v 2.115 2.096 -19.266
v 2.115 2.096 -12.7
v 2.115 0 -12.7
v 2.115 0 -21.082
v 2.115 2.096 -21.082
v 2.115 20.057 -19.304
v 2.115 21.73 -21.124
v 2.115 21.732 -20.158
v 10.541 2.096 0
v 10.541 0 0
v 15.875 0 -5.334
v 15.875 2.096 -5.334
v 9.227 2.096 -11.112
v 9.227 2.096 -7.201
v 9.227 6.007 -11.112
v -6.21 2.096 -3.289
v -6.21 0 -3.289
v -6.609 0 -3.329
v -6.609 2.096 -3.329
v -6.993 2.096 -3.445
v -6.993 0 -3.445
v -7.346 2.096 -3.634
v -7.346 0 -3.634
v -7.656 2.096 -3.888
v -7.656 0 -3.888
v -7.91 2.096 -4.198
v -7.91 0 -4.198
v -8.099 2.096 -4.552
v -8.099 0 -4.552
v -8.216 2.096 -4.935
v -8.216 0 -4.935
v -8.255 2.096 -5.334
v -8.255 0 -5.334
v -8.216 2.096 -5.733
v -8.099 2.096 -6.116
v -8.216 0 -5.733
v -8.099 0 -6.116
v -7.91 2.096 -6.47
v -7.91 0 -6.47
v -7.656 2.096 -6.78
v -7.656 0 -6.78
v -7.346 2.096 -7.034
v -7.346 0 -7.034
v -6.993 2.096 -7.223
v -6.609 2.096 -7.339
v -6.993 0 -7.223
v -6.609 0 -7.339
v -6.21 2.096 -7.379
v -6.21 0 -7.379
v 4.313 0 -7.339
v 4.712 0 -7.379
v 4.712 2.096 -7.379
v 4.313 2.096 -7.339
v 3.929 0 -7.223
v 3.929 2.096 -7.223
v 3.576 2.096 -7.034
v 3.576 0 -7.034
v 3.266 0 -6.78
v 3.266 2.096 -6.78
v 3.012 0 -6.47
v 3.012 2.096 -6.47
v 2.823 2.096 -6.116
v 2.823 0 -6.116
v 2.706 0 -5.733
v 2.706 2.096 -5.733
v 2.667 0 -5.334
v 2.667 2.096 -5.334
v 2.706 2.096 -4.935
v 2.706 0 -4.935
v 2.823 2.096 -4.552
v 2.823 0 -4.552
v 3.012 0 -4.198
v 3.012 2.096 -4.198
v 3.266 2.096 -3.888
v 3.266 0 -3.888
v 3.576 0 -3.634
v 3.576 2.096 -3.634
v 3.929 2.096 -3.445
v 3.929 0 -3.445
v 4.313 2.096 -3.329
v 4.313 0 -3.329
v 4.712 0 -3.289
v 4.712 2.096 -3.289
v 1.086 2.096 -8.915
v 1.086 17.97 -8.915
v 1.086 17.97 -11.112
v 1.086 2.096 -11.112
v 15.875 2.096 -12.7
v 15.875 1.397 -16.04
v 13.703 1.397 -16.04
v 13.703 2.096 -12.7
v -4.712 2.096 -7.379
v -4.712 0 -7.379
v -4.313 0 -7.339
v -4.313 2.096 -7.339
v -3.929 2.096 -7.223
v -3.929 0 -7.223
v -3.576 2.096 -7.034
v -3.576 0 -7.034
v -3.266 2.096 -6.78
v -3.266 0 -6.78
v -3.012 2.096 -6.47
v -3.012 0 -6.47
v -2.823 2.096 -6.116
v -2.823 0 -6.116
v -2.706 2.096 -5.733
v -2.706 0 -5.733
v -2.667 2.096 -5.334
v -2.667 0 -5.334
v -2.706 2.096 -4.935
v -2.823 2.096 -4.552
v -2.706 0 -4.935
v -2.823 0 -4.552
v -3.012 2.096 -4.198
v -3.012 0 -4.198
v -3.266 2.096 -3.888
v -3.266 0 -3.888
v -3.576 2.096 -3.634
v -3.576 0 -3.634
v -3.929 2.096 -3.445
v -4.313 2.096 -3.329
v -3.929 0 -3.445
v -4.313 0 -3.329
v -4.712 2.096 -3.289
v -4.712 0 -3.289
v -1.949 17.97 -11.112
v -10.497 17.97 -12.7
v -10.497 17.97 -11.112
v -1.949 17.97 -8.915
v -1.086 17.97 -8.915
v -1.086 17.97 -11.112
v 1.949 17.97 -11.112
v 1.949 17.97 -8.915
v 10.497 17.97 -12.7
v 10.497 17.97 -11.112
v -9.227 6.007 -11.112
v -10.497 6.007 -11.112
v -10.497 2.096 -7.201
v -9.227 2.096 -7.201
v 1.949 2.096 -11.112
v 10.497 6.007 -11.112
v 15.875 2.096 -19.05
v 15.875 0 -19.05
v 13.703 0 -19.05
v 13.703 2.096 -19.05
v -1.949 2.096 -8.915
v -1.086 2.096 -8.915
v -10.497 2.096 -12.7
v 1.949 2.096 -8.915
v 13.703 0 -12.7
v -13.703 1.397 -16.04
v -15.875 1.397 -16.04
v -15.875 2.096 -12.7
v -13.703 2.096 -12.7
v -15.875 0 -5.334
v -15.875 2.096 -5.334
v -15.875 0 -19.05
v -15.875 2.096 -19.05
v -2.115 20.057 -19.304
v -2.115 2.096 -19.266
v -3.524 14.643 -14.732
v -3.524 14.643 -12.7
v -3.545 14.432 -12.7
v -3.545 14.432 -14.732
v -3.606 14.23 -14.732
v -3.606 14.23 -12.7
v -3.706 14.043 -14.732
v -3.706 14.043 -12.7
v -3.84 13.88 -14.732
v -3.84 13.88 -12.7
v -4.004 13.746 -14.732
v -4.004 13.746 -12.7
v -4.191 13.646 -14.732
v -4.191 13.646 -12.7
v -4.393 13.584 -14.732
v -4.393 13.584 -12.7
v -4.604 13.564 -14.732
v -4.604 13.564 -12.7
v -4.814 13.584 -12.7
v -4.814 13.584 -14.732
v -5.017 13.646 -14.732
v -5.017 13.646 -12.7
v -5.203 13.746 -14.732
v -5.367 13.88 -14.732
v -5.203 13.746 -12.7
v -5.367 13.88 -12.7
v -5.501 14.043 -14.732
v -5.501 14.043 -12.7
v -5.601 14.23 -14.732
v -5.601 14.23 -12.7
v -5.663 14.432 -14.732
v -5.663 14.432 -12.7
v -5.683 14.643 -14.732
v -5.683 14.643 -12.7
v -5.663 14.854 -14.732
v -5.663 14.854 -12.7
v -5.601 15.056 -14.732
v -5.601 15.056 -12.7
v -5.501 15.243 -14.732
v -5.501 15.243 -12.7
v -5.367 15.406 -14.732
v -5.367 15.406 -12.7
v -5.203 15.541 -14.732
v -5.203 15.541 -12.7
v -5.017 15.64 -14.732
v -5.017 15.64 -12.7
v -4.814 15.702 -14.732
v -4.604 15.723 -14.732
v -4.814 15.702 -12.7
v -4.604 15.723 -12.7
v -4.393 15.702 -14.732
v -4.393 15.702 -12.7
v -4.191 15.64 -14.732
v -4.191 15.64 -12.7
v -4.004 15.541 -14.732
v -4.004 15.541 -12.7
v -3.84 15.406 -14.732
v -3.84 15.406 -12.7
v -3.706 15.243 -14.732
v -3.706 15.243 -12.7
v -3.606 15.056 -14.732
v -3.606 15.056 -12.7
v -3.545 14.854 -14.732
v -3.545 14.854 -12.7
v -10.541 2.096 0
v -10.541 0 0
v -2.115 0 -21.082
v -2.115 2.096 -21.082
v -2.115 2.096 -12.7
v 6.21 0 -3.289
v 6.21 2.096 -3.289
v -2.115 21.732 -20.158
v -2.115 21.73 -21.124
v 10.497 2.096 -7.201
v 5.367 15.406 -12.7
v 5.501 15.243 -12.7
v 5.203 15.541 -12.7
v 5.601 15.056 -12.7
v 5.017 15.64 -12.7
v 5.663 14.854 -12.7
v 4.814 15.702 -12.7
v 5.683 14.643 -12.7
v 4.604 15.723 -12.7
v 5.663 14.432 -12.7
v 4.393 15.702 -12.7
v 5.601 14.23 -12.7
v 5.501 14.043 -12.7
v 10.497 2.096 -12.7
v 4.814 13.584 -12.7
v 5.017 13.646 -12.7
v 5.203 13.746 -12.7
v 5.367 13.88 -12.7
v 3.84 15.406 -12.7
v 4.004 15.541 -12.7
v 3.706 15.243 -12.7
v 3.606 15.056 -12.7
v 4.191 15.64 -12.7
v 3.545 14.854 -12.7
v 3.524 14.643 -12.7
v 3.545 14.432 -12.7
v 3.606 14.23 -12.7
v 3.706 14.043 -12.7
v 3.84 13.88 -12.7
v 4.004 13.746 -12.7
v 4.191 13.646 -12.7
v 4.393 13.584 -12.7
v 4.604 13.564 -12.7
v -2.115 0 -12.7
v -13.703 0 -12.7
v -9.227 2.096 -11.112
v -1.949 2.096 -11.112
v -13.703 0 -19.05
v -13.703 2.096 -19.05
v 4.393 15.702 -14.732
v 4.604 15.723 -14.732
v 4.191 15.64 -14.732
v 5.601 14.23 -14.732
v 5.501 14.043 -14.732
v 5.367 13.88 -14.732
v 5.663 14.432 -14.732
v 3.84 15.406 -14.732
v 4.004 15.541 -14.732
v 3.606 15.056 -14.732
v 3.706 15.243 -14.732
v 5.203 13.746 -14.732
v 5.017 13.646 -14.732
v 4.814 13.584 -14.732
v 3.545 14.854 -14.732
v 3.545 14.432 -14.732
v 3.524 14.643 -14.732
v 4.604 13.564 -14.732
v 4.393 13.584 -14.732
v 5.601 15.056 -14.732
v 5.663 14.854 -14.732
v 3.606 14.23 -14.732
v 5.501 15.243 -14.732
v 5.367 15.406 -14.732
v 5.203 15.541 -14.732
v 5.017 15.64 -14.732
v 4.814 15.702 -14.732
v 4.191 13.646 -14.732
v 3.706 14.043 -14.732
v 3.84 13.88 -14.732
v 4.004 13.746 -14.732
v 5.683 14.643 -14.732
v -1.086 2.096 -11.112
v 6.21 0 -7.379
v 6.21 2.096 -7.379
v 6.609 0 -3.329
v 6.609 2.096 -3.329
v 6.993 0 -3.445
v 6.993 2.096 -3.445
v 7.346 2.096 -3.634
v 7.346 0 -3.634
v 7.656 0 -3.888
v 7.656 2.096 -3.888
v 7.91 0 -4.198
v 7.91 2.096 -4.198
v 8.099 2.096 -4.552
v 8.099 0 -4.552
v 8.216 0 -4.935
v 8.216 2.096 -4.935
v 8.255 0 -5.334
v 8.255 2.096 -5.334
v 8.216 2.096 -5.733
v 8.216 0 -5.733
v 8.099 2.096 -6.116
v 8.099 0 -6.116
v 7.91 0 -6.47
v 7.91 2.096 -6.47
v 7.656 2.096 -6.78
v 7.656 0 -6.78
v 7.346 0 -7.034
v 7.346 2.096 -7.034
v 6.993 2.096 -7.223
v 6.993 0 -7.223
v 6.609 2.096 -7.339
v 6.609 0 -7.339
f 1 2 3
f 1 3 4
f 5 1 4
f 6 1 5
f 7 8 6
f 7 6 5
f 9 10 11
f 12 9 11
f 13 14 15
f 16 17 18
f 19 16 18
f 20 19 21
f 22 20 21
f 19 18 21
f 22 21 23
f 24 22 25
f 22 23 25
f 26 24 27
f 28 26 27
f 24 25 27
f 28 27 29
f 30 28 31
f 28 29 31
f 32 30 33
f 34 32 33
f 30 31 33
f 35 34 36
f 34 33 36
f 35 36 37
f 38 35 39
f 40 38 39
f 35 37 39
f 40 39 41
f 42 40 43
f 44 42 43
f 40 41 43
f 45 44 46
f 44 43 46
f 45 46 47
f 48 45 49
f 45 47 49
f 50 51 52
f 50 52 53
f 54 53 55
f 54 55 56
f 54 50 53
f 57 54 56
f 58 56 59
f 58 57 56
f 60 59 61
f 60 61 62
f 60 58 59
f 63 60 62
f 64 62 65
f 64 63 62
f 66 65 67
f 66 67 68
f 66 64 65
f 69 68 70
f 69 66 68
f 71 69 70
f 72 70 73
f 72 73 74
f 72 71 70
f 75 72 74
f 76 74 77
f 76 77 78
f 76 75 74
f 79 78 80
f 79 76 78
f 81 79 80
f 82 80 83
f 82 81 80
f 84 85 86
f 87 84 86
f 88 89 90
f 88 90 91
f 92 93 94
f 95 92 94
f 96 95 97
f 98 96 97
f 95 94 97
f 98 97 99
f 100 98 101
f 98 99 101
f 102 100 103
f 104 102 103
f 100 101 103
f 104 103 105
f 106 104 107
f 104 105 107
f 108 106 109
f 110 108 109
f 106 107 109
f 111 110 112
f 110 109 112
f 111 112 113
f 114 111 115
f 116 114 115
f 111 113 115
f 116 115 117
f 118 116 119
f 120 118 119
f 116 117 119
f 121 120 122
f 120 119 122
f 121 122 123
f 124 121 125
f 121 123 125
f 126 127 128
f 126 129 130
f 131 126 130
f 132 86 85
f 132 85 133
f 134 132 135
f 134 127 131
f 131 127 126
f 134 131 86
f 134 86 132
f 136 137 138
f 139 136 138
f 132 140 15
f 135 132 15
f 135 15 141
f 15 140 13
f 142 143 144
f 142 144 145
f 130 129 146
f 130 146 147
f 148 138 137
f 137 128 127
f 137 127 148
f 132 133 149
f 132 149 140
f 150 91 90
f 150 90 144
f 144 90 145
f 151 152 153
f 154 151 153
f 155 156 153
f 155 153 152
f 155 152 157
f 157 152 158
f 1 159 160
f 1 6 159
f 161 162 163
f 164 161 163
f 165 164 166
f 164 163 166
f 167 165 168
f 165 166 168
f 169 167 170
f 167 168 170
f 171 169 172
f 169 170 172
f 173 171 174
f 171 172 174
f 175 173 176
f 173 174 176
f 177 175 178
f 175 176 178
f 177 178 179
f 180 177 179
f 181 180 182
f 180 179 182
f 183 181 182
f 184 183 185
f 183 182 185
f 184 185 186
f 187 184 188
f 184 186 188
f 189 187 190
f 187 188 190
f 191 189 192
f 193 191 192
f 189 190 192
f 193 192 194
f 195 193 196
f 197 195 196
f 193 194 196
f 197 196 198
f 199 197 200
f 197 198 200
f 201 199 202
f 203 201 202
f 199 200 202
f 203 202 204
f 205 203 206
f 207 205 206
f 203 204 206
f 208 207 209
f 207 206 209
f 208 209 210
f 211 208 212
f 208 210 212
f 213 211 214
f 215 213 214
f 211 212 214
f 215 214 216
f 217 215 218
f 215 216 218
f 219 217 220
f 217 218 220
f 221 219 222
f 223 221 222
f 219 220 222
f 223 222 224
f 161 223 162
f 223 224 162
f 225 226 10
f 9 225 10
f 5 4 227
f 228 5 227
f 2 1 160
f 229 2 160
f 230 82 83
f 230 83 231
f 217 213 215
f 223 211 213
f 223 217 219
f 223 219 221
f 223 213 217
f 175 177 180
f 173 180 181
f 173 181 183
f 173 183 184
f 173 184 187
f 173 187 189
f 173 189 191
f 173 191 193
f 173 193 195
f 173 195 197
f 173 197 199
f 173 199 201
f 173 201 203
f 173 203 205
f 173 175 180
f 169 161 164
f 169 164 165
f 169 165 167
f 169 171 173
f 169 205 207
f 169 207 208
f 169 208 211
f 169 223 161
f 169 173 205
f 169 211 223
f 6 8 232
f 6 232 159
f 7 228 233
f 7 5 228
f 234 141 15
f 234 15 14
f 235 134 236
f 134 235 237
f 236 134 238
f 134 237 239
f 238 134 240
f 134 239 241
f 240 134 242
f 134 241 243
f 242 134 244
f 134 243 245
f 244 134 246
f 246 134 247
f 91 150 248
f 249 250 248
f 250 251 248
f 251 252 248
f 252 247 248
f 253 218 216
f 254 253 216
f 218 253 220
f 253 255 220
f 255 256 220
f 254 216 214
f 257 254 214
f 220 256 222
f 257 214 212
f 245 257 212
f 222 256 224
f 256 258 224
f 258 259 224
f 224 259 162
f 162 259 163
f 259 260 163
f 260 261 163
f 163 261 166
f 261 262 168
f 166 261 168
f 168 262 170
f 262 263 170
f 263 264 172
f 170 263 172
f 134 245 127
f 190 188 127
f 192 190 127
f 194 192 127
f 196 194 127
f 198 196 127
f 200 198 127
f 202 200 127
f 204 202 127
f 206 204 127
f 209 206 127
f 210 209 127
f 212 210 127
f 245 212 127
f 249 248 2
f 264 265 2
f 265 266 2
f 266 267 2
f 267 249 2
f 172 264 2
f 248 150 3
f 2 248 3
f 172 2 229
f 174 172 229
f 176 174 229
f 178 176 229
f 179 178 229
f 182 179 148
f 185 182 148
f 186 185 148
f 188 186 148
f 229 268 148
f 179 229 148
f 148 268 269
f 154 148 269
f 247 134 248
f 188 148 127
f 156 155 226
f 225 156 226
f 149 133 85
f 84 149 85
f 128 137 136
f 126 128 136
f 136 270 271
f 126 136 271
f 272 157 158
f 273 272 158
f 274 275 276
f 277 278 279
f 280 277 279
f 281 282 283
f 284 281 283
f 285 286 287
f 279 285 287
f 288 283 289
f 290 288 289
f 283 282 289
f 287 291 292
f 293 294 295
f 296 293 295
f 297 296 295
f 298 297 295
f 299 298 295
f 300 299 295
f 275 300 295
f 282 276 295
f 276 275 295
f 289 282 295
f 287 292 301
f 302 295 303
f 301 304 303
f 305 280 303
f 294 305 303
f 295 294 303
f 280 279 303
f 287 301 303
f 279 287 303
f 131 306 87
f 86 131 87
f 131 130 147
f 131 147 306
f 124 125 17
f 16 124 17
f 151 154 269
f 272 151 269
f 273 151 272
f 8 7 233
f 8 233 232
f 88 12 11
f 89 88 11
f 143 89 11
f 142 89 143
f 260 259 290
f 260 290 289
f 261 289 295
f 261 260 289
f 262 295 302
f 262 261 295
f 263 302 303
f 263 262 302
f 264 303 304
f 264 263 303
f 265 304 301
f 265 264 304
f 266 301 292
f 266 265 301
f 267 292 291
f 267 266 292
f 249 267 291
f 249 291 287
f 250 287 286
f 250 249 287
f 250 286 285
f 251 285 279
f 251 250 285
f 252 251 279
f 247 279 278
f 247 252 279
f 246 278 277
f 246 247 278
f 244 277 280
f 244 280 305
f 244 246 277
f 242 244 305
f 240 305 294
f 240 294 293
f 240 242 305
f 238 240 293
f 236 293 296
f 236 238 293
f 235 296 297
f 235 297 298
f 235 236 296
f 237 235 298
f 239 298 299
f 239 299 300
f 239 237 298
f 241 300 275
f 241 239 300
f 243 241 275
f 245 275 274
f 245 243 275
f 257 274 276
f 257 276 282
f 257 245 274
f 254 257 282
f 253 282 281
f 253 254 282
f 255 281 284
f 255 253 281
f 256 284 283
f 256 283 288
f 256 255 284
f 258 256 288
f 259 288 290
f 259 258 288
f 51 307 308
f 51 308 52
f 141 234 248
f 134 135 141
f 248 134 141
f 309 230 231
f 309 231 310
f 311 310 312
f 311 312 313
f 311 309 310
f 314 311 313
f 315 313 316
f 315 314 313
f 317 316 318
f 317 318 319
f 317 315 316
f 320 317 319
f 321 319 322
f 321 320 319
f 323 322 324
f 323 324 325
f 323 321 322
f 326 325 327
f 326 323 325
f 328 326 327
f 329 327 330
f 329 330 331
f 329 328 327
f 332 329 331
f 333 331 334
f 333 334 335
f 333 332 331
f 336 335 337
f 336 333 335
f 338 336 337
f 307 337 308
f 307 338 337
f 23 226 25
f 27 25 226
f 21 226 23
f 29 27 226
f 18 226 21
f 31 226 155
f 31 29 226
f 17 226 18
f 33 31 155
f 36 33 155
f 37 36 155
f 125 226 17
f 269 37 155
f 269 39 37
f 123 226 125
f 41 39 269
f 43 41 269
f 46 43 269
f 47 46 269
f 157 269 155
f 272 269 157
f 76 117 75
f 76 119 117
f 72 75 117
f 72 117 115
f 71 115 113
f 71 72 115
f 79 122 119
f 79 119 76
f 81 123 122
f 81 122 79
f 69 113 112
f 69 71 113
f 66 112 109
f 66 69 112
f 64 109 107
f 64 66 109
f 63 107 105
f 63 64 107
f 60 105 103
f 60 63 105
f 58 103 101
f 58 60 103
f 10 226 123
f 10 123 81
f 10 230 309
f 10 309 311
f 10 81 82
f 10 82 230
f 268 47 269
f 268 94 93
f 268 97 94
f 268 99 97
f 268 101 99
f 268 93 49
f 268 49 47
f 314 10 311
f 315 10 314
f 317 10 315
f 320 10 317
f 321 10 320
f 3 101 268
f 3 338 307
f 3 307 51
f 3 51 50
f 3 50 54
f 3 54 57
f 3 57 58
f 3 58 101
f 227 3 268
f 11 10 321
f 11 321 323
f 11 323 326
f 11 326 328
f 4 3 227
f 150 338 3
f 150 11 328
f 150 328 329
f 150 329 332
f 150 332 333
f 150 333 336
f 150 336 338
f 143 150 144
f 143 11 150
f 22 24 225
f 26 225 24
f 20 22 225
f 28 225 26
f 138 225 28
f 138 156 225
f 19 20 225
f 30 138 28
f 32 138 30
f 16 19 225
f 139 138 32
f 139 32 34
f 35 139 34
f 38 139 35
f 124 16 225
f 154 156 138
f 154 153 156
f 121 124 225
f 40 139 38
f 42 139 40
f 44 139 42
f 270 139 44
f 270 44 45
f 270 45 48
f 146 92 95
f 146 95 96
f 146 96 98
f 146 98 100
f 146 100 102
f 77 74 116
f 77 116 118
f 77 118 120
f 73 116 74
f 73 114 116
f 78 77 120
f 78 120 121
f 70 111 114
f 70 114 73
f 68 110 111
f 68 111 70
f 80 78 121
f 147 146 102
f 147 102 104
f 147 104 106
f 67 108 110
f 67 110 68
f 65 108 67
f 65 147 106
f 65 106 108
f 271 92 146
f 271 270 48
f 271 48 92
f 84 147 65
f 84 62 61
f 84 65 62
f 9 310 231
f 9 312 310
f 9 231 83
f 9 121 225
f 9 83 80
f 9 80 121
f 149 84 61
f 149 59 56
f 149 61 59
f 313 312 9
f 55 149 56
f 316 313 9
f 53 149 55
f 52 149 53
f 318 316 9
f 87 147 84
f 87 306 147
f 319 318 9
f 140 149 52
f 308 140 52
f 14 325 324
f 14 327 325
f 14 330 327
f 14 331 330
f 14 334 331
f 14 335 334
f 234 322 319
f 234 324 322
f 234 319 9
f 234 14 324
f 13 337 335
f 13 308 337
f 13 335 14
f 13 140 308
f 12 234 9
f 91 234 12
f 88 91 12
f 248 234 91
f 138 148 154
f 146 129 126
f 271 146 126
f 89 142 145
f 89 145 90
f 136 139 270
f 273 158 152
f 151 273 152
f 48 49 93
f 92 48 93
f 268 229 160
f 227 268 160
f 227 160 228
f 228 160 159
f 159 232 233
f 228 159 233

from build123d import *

# Parameters (mm, degrees)
BOSS_EXTRUDE1_DEPTH = 2.0955
SKETCH2_W           = 20.9931
SKETCH2_H           = 1.5875
BOSS_EXTRUDE2_DEPTH = 15.875
BOSS_EXTRUDE3_DEPTH = 1.27
SKETCH5_W           = 0.8636
SKETCH5_H           = 2.1971
BOSS_EXTRUDE4_DEPTH = 15.875
SKETCH6_R           = 1.0795
BOSS_EXTRUDE5_DEPTH = 2.032
BOSS_EXTRUDE6_DEPTH = 2.1717
SKETCH8_W           = 4.2291
SKETCH8_H           = 8.382
BOSS_EXTRUDE7_DEPTH = 2.0955
BOSS_EXTRUDE8_DEPTH = 2.11455


with BuildPart() as part:
    # Sketch1 → Boss-Extrude1 (new body)
    with BuildSketch(Plane(origin=(0, 0, 0), x_dir=(1, 0, 0), z_dir=(0, 1, 0))):
        Polygon((10.541, 0), (15.875, 5.334), (15.875, 12.7), (-15.875, 12.7), (-15.875, 5.334), (-10.541, 0), align=None)
        with BuildLine():
            Line((-6.2103, 7.3787), (-4.7117, 7.3787))
            ThreePointArc((-4.7117, 7.3787), (-2.667, 5.334), (-4.7117, 3.2893))
            Line((-4.7117, 3.2893), (-6.2103, 3.2893))
            ThreePointArc((-6.2103, 3.2893), (-8.255, 5.334), (-6.2103, 7.3787))
        make_face(mode=Mode.SUBTRACT)
        with BuildLine():
            Line((6.2103, 7.3787), (4.7117, 7.3787))
            ThreePointArc((4.7117, 7.3787), (2.667, 5.334), (4.7117, 3.2893))
            Line((4.7117, 3.2893), (6.2103, 3.2893))
            ThreePointArc((6.2103, 3.2893), (8.255, 5.334), (6.2103, 7.3787))
        make_face(mode=Mode.SUBTRACT)
    extrude(amount=BOSS_EXTRUDE1_DEPTH)

    # Sketch2 → Boss-Extrude2 (add)
    with BuildSketch(Plane(origin=(0, 2.0955, 0), x_dir=(1, 0, 0), z_dir=(0, 1, 0))):
        with Locations((0, 11.90625)):
            Rectangle(SKETCH2_W, SKETCH2_H)
    extrude(amount=BOSS_EXTRUDE2_DEPTH)

    # Sketch4 → Boss-Extrude3 (add)
    with BuildSketch(Plane.ZY.offset(10.49655)):
        Polygon((-11.1125, 6.0071), (-7.2009, 2.0955), (-11.1125, 2.0955), align=None)
    boss_extrude3 = extrude(amount=-BOSS_EXTRUDE3_DEPTH)

    # Sketch5 → Boss-Extrude4 (add)
    with BuildSketch(Plane(origin=(0, 17.9705, 0), x_dir=(1, 0, 0), z_dir=(0, 1, 0))):
        with Locations((-1.51765, 10.01395)):
            Rectangle(SKETCH5_W, SKETCH5_H)
    boss_extrude4 = extrude(amount=-BOSS_EXTRUDE4_DEPTH)

    # Sketch6 → Boss-Extrude5 (add)
    with BuildSketch(Plane(origin=(0, 0, -12.7), x_dir=(-1, 0, 0), z_dir=(0, 0, -1))):
        with Locations(Location((4.60375, 14.6431, 0), (0, 0, 180))):
            Circle(SKETCH6_R)
    boss_extrude5 = extrude(amount=BOSS_EXTRUDE5_DEPTH)

    # Sketch7 → Boss-Extrude6 (add)
    with BuildSketch(Plane.ZY.offset(15.875)):
        Polygon((-12.7, 0), (-19.05, 0), (-19.05, 2.0955), (-16.0401, 1.397), (-12.7, 2.0955), align=None)
    boss_extrude6 = extrude(amount=-BOSS_EXTRUDE6_DEPTH)

    # Mirror1: Boss-Extrude3, Boss-Extrude4, Boss-Extrude5, Boss-Extrude6 across plane
    add(boss_extrude3.mirror(Plane(origin=(0, 0, 0), x_dir=(0, 0, 1), z_dir=(1, 0, 0))))
    add(boss_extrude4.mirror(Plane(origin=(0, 0, 0), x_dir=(0, 0, 1), z_dir=(1, 0, 0))))
    add(boss_extrude5.mirror(Plane(origin=(0, 0, 0), x_dir=(0, 0, 1), z_dir=(1, 0, 0))))
    add(boss_extrude6.mirror(Plane(origin=(0, 0, 0), x_dir=(0, 0, 1), z_dir=(1, 0, 0))))

    # Sketch8 → Boss-Extrude7 (add)
    with BuildSketch(Plane(origin=(0, 0, 0), x_dir=(-1, 0, 0), z_dir=(0, -1, 0))):
        with Locations((0, 16.891)):
            Rectangle(SKETCH8_W, SKETCH8_H)
    extrude(amount=-BOSS_EXTRUDE7_DEPTH)

    # Sketch9 → Boss-Extrude8 (add, symmetric)
    with BuildSketch(Plane(origin=(0, 0, 0), x_dir=(0, 0, -1), z_dir=(1, 0, 0))):
        Polygon((21.082, 2.0955), (21.123652242, 21.7297), (20.158454414, 21.731747583), (19.304, 20.057156461), (19.265895913, 2.0955), align=None)
    extrude(amount=BOSS_EXTRUDE8_DEPTH, both=True)


solid = part.part
